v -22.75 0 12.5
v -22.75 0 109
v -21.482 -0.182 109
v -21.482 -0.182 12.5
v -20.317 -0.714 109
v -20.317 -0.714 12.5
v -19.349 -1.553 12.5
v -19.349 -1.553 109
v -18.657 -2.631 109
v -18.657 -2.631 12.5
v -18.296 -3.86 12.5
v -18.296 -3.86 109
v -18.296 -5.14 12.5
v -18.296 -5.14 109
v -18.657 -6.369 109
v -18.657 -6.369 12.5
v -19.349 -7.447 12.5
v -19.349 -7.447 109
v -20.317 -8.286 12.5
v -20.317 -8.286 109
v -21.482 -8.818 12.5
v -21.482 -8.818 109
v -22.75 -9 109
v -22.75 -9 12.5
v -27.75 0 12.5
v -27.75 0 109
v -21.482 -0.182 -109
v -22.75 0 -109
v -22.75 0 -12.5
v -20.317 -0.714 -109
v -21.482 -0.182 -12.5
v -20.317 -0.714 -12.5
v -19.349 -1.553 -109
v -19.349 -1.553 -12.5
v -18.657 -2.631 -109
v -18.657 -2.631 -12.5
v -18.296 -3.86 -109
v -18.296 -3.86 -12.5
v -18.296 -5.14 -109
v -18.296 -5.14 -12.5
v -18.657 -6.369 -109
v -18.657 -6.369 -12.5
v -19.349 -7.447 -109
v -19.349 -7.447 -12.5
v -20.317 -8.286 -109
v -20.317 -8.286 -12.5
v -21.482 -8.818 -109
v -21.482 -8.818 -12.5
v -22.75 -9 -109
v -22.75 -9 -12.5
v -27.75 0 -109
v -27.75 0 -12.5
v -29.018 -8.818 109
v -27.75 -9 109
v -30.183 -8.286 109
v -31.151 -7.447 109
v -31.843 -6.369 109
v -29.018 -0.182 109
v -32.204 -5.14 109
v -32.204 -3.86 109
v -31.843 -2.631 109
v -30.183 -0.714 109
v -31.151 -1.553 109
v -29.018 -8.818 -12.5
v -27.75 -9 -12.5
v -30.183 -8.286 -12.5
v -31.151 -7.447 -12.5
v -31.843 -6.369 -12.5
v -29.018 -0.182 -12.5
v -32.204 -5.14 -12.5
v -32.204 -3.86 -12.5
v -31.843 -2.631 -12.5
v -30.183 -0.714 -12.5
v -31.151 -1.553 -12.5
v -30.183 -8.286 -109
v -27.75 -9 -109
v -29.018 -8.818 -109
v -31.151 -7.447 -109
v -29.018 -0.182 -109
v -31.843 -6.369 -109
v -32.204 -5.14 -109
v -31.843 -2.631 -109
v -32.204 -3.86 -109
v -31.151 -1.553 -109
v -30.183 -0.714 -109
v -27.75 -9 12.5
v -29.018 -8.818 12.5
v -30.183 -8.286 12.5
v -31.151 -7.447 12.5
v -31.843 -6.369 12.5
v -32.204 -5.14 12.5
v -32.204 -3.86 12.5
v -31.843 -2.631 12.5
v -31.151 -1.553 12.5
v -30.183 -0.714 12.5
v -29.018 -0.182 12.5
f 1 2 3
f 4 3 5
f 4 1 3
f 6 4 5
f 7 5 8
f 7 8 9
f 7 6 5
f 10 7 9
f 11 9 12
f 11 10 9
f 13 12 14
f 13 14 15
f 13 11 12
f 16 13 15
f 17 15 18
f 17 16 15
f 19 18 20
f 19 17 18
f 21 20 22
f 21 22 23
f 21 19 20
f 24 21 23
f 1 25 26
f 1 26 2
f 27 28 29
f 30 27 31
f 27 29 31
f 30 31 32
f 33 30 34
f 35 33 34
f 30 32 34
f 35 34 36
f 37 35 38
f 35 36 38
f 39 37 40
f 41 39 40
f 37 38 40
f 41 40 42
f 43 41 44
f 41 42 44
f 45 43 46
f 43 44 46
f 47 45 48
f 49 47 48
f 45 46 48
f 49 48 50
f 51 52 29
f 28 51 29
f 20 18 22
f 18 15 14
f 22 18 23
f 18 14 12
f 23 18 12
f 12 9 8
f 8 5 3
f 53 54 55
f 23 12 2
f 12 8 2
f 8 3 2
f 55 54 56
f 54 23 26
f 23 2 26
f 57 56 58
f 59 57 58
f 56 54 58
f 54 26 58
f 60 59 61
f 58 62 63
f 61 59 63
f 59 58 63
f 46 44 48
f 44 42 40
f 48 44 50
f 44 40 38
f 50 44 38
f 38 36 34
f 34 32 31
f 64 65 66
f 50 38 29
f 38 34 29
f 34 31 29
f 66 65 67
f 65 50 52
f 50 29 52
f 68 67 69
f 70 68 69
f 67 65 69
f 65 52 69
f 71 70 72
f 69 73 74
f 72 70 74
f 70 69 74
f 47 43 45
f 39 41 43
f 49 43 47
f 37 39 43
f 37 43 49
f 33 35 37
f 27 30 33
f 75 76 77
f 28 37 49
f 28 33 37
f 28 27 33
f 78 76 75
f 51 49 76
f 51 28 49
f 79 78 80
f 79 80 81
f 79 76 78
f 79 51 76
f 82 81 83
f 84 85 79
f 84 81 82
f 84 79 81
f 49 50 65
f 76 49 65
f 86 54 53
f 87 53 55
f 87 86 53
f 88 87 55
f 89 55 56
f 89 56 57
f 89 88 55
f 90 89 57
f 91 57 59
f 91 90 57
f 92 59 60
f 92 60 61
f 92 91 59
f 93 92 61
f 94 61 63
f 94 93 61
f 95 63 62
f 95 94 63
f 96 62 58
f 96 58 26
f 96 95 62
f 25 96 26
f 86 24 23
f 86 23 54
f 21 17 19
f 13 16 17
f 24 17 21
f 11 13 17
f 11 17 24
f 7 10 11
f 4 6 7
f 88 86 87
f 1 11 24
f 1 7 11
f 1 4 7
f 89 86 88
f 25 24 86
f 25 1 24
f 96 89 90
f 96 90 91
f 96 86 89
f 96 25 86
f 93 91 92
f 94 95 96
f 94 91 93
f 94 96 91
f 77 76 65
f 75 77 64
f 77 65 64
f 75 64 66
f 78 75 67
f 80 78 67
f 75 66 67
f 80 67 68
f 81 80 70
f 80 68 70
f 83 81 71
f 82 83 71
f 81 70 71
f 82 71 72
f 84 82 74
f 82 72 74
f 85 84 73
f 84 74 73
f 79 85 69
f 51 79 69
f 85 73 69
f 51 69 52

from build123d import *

# Parameters (mm, degrees)
EXTRUDE_START   = -12.5
EXTRUDE_1_DEPTH = 96.5
EXTRUDE_START_2 = 12.5
EXTRUDE_2_DEPTH = 96.5


with BuildPart() as part:
    # Эскиз1 → Бобышка-Вытянуть1 (new body)
    with BuildSketch(Plane.XY.offset(EXTRUDE_START)):
        with BuildLine():
            Line((-27.75, 0), (-22.75, 0))
            ThreePointArc((-22.75, 0), (-18.25, -4.5), (-22.75, -9))
            Line((-22.75, -9), (-27.75, -9))
            ThreePointArc((-27.75, -9), (-32.25, -4.5), (-27.75, 0))
        make_face()
    extrude(amount=-EXTRUDE_1_DEPTH)


with BuildPart() as body_2:
    # Эскиз1<2> → Бобышка-Вытянуть2 (new body)
    with BuildSketch(Plane.XY.offset(EXTRUDE_START_2)):
        with BuildLine():
            Line((-27.75, 0), (-22.75, 0))
            ThreePointArc((-22.75, 0), (-18.25, -4.5), (-22.75, -9))
            Line((-22.75, -9), (-27.75, -9))
            ThreePointArc((-27.75, -9), (-32.25, -4.5), (-27.75, 0))
        make_face()
    extrude(amount=EXTRUDE_2_DEPTH)


solid = Compound([part.part, body_2.part])
